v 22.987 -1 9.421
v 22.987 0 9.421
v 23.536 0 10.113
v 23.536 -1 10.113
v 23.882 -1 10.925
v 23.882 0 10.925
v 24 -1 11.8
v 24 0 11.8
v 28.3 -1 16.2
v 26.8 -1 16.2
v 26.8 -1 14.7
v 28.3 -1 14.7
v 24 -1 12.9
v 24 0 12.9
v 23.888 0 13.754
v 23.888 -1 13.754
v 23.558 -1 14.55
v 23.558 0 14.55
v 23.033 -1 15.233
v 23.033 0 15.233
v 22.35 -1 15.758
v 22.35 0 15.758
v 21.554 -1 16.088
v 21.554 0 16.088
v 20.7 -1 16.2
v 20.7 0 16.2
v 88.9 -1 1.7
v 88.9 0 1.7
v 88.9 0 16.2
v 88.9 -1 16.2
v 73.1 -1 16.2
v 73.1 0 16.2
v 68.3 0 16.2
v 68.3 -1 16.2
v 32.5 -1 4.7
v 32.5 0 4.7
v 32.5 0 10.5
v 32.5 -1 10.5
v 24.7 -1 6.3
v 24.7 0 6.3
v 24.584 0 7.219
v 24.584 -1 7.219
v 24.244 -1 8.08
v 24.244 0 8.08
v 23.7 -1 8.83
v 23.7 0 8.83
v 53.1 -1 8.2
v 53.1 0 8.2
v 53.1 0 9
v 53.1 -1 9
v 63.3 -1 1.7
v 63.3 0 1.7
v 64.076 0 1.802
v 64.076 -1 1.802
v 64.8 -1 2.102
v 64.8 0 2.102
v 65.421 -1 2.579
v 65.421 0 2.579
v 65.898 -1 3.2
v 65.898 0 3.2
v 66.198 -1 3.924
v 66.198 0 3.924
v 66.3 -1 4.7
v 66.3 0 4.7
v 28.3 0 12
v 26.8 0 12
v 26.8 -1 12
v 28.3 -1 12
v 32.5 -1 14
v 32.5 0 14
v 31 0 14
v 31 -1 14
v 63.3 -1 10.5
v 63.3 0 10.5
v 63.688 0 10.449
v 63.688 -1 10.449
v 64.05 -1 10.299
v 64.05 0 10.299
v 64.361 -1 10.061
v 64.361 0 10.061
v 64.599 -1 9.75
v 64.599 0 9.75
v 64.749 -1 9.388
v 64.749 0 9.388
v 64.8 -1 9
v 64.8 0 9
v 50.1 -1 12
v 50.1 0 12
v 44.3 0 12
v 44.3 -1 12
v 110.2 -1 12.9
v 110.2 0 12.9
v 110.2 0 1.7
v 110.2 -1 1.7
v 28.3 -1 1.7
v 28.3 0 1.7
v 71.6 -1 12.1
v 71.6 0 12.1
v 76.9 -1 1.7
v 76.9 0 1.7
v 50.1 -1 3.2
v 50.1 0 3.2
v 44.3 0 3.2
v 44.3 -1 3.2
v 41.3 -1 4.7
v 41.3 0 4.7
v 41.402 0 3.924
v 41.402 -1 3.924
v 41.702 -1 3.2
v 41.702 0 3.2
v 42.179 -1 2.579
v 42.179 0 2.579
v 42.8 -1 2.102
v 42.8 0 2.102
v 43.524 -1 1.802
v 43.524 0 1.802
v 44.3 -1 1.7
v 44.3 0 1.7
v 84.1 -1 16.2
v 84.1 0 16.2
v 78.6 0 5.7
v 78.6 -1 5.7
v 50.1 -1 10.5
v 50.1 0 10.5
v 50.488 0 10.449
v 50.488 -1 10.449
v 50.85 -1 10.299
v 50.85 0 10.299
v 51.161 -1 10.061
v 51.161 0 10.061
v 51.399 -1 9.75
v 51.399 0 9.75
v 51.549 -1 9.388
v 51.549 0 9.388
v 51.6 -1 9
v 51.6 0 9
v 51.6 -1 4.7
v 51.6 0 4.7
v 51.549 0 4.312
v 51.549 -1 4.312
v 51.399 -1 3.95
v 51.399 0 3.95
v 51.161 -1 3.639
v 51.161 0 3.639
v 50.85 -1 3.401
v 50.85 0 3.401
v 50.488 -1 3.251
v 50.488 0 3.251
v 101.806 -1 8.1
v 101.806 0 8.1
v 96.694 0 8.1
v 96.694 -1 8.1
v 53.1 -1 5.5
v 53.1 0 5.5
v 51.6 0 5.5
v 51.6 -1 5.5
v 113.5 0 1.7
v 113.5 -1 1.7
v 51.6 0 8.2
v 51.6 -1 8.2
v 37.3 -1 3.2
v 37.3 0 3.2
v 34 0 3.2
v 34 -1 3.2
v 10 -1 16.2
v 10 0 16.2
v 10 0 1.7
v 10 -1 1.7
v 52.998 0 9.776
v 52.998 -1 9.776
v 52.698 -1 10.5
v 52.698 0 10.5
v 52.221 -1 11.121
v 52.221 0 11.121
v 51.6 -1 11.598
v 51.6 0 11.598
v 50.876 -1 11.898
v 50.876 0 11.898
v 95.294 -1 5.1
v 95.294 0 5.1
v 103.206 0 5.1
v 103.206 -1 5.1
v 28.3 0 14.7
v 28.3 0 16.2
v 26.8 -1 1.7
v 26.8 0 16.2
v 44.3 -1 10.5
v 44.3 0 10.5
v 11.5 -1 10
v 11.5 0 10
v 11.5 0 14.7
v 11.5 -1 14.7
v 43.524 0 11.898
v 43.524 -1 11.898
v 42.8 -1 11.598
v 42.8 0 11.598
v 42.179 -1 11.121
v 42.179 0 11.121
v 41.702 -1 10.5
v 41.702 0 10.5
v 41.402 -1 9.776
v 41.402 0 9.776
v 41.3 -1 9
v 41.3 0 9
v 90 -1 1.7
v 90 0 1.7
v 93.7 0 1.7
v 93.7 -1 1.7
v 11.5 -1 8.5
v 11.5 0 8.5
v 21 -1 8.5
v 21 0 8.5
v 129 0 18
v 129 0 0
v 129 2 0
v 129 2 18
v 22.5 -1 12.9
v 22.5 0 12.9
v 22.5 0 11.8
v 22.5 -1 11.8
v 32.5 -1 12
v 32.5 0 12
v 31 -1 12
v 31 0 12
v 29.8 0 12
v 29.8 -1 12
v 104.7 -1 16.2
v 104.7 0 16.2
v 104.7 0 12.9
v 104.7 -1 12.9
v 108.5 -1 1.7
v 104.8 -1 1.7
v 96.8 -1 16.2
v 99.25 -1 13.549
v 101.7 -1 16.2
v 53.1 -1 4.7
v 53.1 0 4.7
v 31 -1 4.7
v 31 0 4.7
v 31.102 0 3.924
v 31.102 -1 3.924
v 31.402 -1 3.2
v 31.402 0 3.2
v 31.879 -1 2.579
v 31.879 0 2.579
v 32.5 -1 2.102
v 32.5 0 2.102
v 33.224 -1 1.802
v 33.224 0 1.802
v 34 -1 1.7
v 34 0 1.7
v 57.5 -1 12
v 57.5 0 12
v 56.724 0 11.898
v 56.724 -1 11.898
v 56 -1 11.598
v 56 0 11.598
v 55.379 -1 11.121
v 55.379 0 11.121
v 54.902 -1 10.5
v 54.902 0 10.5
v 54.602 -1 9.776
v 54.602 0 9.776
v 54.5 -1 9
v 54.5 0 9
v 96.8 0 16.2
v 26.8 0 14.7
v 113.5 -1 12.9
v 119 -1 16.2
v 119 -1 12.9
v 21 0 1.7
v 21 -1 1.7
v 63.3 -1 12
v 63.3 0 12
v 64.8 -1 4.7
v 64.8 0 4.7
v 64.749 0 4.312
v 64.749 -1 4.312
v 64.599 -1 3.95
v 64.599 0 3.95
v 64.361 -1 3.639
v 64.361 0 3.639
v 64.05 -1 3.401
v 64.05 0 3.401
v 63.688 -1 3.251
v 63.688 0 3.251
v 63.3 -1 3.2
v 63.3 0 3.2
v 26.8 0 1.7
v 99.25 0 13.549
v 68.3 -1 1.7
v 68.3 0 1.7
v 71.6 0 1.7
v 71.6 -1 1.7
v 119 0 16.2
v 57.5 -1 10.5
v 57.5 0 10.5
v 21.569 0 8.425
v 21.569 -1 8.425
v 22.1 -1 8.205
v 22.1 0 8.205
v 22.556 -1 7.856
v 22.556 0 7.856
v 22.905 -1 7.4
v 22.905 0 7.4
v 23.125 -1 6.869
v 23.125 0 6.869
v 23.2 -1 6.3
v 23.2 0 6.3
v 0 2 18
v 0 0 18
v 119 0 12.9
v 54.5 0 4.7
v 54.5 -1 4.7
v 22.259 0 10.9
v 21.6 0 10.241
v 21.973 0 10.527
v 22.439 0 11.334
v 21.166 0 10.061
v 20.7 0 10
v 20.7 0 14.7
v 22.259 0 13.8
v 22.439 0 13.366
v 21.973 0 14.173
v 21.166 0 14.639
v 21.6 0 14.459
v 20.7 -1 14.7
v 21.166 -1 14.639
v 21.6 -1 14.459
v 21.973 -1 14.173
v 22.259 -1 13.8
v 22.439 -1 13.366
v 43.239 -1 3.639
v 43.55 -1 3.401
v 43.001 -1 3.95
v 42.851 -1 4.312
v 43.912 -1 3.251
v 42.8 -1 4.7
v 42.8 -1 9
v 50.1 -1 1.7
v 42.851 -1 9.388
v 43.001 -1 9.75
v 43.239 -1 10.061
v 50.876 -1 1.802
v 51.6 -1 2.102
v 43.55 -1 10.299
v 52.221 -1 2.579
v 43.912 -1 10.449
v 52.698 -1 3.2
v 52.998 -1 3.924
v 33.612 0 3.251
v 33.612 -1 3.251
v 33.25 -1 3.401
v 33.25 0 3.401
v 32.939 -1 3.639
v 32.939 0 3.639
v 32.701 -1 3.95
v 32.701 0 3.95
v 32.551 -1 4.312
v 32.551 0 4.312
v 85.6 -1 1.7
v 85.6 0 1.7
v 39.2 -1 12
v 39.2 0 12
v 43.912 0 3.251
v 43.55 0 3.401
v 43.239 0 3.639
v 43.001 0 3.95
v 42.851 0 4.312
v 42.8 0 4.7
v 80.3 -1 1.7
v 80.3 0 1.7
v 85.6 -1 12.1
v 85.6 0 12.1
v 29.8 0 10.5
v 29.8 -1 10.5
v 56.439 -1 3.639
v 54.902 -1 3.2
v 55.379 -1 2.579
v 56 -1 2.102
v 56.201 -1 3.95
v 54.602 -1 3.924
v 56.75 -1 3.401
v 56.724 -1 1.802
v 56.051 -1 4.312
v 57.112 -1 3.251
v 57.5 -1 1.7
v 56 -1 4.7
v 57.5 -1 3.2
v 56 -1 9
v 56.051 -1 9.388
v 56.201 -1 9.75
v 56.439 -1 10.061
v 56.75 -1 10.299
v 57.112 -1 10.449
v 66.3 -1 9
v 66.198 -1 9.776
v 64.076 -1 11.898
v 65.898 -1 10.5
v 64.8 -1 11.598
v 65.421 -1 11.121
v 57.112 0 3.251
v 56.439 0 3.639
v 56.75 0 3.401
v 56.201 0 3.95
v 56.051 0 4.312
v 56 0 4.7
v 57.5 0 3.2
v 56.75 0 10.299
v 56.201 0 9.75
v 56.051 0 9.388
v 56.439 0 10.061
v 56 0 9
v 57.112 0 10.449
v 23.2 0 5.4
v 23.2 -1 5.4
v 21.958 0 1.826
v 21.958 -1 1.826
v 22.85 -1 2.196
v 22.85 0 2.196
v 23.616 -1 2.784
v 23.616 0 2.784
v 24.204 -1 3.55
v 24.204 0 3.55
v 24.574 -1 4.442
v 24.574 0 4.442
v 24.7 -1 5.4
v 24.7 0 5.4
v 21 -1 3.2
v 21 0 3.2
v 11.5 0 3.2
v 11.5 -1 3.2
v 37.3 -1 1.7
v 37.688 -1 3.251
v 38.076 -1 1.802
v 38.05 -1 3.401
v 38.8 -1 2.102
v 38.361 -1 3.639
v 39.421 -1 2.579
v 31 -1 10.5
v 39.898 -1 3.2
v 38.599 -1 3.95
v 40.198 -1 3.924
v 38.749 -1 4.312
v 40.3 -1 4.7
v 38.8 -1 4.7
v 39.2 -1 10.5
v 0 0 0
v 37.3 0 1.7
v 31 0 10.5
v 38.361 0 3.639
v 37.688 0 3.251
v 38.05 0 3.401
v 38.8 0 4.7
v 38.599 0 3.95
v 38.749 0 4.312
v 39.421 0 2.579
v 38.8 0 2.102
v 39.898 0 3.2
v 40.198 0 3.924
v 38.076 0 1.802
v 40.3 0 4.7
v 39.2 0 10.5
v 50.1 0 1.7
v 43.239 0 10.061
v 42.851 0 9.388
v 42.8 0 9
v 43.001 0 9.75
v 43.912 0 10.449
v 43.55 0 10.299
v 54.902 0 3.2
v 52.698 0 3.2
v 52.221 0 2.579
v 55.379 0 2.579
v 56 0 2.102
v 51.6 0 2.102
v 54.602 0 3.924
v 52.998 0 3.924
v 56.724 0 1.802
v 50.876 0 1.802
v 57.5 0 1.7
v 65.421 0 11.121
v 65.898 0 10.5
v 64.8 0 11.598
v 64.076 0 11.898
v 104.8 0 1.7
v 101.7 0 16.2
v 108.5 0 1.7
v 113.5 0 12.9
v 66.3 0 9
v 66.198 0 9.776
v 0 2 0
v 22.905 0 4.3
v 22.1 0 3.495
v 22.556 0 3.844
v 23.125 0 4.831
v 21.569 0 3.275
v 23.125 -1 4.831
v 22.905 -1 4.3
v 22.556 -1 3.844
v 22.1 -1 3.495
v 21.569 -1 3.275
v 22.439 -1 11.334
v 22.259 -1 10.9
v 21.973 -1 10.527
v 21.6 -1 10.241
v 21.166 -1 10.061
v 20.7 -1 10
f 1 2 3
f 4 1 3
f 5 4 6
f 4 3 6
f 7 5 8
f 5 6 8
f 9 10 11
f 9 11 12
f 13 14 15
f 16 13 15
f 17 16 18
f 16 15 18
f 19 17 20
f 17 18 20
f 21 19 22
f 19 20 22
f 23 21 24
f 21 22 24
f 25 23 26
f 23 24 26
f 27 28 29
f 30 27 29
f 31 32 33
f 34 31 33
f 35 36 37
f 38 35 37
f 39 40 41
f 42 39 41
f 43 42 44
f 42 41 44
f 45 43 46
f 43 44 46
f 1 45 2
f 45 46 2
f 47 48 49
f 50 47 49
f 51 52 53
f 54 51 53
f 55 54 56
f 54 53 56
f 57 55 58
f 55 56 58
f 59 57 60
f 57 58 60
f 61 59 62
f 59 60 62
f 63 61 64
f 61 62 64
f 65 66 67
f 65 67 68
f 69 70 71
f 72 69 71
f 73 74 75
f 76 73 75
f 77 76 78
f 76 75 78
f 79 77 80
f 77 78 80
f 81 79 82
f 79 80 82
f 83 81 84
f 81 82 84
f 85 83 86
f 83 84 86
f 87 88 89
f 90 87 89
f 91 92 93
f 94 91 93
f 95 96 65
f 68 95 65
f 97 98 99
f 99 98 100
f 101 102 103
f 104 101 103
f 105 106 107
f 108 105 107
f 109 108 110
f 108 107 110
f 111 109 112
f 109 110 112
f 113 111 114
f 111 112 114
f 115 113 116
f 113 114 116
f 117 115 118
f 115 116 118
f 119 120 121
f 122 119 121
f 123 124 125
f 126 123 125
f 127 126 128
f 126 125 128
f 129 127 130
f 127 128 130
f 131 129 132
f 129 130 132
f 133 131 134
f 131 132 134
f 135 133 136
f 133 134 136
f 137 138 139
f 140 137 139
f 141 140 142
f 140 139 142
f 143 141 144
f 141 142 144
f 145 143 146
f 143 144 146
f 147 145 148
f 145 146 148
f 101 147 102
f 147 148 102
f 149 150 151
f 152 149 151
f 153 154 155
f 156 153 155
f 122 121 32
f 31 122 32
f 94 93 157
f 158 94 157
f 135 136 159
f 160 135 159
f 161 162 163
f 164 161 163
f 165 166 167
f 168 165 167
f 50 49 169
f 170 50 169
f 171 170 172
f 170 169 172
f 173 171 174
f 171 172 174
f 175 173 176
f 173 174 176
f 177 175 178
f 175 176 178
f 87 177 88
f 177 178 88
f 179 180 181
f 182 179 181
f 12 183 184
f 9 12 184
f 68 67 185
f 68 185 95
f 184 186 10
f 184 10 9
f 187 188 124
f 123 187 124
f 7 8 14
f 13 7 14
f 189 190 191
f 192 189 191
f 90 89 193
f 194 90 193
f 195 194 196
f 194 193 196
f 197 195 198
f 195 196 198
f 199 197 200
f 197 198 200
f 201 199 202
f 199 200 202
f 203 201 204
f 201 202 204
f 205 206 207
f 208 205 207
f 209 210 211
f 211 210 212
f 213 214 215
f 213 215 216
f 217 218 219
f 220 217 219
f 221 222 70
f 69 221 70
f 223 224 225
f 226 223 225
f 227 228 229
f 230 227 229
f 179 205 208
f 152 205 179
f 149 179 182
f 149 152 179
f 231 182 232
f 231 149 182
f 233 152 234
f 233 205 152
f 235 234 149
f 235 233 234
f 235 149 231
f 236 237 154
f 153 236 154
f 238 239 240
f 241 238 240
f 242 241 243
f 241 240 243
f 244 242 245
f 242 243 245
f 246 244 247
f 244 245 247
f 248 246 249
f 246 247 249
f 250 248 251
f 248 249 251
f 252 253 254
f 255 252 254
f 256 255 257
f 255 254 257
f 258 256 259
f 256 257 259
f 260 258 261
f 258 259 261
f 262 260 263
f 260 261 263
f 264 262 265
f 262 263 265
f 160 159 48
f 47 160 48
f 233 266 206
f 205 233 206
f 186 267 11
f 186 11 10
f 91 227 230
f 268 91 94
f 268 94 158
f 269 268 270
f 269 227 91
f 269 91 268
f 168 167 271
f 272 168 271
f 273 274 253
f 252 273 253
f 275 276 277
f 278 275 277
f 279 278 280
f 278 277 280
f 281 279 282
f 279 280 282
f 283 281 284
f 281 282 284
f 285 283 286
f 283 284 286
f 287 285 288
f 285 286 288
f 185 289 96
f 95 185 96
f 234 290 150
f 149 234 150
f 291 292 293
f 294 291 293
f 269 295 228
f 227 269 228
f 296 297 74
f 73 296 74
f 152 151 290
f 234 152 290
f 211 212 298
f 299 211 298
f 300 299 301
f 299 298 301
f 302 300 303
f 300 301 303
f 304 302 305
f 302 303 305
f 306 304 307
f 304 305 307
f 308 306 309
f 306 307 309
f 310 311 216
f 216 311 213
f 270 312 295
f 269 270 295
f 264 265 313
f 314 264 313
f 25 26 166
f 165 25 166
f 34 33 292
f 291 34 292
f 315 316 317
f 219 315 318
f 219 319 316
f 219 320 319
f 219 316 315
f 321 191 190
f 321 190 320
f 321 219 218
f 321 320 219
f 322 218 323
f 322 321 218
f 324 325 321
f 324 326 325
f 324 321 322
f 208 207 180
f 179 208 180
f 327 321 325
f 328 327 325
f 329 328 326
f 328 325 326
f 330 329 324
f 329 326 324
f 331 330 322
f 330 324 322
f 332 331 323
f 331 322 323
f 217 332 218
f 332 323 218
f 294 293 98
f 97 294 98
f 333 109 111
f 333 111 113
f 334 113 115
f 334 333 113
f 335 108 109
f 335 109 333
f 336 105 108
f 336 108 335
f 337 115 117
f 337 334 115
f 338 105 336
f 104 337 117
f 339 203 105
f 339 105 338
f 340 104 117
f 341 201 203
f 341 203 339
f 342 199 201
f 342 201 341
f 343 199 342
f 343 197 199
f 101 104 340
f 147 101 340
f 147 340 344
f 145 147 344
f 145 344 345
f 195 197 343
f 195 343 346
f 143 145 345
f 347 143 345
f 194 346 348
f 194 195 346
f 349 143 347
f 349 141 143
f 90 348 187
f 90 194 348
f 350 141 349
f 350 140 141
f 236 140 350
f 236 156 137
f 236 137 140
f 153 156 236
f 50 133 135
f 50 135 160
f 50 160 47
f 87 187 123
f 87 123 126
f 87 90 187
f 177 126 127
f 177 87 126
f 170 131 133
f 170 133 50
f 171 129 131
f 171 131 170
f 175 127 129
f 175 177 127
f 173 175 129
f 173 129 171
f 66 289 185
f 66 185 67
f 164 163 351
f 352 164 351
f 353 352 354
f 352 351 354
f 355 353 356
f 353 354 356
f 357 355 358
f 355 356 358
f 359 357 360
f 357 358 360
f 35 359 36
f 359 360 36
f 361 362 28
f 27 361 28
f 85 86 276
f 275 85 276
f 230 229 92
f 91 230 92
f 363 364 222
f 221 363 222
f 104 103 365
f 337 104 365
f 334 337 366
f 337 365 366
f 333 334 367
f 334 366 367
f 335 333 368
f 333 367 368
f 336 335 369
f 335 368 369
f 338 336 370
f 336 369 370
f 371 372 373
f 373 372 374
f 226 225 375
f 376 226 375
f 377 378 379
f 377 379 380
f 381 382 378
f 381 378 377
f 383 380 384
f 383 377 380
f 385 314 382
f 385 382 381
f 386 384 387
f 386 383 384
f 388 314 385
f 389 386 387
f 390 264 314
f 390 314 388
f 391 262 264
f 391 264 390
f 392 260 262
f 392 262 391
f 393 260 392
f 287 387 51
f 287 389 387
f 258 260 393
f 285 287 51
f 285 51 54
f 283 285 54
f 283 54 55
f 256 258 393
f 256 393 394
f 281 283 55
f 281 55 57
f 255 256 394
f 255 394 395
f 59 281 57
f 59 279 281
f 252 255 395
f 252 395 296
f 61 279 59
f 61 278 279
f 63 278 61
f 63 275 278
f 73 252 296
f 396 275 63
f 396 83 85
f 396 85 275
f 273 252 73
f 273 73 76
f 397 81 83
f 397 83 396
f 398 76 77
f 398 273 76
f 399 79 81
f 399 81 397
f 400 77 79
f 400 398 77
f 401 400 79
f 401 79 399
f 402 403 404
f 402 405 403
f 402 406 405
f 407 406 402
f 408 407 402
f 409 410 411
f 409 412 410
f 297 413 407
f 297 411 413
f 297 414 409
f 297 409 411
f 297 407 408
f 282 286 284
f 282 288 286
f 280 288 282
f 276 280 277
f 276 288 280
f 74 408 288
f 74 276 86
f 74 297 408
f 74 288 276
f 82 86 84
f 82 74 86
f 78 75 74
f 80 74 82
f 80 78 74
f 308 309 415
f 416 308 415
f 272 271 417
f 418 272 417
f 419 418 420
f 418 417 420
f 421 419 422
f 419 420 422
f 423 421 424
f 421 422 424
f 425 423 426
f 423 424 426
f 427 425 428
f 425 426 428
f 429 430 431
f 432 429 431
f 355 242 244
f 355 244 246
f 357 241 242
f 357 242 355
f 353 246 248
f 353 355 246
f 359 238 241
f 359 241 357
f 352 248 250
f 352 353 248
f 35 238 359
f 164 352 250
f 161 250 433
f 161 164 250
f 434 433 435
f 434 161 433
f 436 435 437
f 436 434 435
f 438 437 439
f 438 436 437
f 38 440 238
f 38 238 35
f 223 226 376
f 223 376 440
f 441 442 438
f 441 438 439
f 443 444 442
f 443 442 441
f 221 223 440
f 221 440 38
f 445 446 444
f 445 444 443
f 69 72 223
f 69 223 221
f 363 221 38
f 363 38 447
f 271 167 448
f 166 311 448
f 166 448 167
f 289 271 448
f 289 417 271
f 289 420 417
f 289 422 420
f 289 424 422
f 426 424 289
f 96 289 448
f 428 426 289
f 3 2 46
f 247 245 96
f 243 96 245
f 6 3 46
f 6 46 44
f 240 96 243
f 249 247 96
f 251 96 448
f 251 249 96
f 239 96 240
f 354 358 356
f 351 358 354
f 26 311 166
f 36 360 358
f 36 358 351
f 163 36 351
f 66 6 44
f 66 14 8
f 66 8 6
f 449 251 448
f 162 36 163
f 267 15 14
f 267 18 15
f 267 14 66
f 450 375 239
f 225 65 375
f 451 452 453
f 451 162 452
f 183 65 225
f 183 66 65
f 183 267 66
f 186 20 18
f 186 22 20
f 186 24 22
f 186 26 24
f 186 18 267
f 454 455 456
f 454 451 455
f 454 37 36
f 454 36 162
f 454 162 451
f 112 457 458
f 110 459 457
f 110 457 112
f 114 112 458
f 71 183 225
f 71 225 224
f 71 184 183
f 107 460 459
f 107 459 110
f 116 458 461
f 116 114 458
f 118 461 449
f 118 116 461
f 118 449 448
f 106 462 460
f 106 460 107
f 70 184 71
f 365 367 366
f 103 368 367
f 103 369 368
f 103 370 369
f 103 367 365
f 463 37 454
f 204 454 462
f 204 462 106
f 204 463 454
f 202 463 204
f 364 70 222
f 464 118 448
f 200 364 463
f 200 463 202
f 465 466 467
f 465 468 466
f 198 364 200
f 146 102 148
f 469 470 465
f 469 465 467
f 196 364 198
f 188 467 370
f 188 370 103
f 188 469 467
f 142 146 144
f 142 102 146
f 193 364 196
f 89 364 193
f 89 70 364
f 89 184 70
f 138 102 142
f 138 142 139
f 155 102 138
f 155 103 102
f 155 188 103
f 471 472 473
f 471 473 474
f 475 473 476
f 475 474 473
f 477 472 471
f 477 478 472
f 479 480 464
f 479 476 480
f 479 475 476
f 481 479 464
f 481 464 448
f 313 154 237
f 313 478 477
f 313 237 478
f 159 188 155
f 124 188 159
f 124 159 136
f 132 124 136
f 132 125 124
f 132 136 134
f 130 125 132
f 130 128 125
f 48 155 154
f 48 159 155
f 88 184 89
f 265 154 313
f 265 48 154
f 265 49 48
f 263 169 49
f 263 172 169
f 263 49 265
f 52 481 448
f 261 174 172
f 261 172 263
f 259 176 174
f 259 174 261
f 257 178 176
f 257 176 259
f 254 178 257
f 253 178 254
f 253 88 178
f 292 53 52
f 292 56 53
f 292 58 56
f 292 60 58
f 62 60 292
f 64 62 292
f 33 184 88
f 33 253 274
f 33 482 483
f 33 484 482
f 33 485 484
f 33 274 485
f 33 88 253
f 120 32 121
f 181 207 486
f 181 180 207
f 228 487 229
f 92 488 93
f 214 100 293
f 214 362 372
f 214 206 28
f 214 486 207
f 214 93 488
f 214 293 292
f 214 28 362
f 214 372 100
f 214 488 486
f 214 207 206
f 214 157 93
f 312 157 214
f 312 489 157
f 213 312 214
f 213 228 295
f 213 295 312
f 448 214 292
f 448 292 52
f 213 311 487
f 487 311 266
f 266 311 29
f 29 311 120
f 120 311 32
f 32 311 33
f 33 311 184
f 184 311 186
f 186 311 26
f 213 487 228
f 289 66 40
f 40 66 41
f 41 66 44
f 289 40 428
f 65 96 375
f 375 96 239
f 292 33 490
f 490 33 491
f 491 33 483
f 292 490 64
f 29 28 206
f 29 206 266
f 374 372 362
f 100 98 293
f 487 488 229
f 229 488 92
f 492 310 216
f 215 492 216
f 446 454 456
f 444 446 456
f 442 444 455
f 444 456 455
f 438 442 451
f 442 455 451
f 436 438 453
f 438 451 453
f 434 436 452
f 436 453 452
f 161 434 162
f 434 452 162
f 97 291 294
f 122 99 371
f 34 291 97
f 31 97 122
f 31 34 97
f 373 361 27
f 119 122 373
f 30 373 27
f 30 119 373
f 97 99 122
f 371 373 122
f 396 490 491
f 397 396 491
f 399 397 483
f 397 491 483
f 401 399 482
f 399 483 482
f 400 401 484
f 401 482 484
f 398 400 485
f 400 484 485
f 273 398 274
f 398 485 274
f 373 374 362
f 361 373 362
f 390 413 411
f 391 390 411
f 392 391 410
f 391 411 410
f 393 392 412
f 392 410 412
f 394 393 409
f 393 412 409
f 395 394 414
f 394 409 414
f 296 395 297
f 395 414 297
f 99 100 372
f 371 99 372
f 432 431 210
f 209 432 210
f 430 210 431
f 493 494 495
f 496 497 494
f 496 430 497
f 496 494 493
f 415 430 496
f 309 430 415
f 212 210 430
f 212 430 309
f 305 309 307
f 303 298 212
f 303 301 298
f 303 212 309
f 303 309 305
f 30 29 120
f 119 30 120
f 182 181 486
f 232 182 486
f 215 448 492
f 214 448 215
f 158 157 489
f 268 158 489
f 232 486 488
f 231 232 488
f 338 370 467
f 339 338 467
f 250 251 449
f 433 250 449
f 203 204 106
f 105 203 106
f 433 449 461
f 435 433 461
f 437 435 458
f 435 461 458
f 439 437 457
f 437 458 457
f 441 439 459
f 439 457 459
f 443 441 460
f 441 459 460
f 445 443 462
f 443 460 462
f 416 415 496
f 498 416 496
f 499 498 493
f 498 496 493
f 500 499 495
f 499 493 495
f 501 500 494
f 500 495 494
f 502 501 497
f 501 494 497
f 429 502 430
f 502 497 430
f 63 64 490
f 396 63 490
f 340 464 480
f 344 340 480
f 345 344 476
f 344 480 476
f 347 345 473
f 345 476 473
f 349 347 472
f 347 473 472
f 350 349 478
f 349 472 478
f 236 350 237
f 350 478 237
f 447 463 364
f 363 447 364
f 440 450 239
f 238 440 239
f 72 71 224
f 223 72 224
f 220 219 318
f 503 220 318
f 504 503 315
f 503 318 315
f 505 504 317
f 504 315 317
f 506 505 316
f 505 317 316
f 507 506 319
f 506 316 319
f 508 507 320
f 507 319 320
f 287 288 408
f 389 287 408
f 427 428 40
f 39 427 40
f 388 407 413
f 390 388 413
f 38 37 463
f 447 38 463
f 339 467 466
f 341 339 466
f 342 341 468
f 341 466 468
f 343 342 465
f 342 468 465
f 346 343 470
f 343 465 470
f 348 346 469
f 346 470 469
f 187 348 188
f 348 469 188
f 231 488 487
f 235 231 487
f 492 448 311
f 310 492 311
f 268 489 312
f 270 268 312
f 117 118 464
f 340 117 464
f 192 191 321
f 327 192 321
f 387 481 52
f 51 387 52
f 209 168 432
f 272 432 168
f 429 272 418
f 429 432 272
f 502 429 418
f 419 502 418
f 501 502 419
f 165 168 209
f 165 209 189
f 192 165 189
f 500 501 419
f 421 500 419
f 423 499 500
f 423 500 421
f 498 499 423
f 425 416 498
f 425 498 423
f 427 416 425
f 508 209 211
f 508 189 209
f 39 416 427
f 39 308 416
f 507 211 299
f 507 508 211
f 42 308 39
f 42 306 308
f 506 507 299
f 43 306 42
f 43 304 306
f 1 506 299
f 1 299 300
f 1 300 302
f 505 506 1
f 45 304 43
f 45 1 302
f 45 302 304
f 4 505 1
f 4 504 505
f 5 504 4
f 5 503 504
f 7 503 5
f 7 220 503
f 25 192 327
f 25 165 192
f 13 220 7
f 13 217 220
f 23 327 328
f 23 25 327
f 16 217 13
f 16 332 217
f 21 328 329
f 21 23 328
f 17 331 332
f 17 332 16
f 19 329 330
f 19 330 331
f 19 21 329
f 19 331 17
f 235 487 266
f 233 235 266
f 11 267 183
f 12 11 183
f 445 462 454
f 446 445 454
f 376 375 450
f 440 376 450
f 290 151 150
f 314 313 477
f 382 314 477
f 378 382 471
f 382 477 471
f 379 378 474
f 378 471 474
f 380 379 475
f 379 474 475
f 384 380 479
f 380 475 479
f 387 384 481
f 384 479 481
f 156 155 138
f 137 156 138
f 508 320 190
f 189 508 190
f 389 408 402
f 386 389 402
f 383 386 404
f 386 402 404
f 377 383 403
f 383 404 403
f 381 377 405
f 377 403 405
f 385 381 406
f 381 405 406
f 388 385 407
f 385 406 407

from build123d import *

# Parameters (mm, degrees)
F0_W     = 129
F0_H     = 18
F0_W_2   = 1.5
F0_H_2   = 10.3
F0_R     = 2.1
F0_H_3   = 1.5
F1_DEPTH = 2
F2_DEPTH = 1
F3_R     = 2.1
F4_DEPTH = 2


with BuildPart() as f1:
    # F0 (on Front) → F1 (new body)
    with BuildSketch(Plane.XZ):
        with Locations((64.5, 9)):
            Rectangle(F0_W, F0_H)
        with Locations((27.55, 6.85)):
            Rectangle(F0_W_2, F0_H_2, mode=Mode.SUBTRACT)
        with BuildLine():
            Line((10, 1.7), (10, 16.2))
            Line((10, 16.2), (20.7, 16.2))
            ThreePointArc((20.7, 16.2), (23.0334523779, 15.2334523779), (24, 12.9))
            Line((24, 12.9), (24, 11.8))
            ThreePointArc((24, 11.8), (23.7362385725, 10.5072295908), (22.9871179813, 9.4211155263))
            ThreePointArc((22.9871179813, 9.4211155263), (24.2436350389, 8.0801212696), (24.7, 6.3))
            Line((24.7, 6.3), (24.7, 5.4))
            ThreePointArc((24.7, 5.4), (23.6162950904, 2.7837049096), (21, 1.7))
            Line((21, 1.7), (10, 1.7))
        make_face(mode=Mode.SUBTRACT)
        with BuildLine():
            Line((32.5, 10.5), (32.5, 4.7))
            ThreePointArc((32.5, 4.7), (32.9393398282, 3.6393398282), (34, 3.2))
            Line((34, 3.2), (37.3, 3.2))
            ThreePointArc((37.3, 3.2), (38.3606601718, 3.6393398282), (38.8, 4.7))
            Line((38.8, 4.7), (40.3, 4.7))
            ThreePointArc((40.3, 4.7), (39.4213203436, 2.5786796564), (37.3, 1.7))
            Line((37.3, 1.7), (34, 1.7))
            ThreePointArc((34, 1.7), (31.8786796564, 2.5786796564), (31, 4.7))
            Line((31, 4.7), (31, 10.5))
            Line((31, 10.5), (29.8, 10.5))
            Line((29.8, 10.5), (29.8, 12))
            Line((29.8, 12), (31, 12))
            Line((31, 12), (31, 14))
            Line((31, 14), (32.5, 14))
            Line((32.5, 14), (32.5, 12))
            Line((32.5, 12), (39.2, 12))
            Line((39.2, 12), (39.2, 10.5))
            Line((39.2, 10.5), (32.5, 10.5))
        make_face(mode=Mode.SUBTRACT)
        with BuildLine():
            Line((50.1, 10.5), (44.3, 10.5))
            ThreePointArc((44.3, 10.5), (43.2393398282, 10.0606601718), (42.8, 9))
            Line((42.8, 9), (42.8, 4.7))
            ThreePointArc((42.8, 4.7), (43.2393398282, 3.6393398282), (44.3, 3.2))
            Line((44.3, 3.2), (50.1, 3.2))
            ThreePointArc((50.1, 3.2), (51.1606601718, 3.6393398282), (51.6, 4.7))
            Line((51.6, 4.7), (51.6, 5.5))
            Line((51.6, 5.5), (53.1, 5.5))
            Line((53.1, 5.5), (53.1, 4.7))
            ThreePointArc((53.1, 4.7), (52.2213203436, 2.5786796564), (50.1, 1.7))
            Line((50.1, 1.7), (44.3, 1.7))
            ThreePointArc((44.3, 1.7), (42.1786796564, 2.5786796564), (41.3, 4.7))
            Line((41.3, 4.7), (41.3, 9))
            ThreePointArc((41.3, 9), (42.1786796564, 11.1213203436), (44.3, 12))
            Line((44.3, 12), (50.1, 12))
            ThreePointArc((50.1, 12), (52.2213203436, 11.1213203436), (53.1, 9))
            Line((53.1, 9), (53.1, 8.2))
            Line((53.1, 8.2), (51.6, 8.2))
            Line((51.6, 8.2), (51.6, 9))
            ThreePointArc((51.6, 9), (51.1606601718, 10.0606601718), (50.1, 10.5))
        make_face(mode=Mode.SUBTRACT)
        with BuildLine():
            ThreePointArc((54.5, 9), (55.3786796564, 11.1213203436), (57.5, 12))
            Line((57.5, 12), (63.3, 12))
            ThreePointArc((63.3, 12), (65.4213203436, 11.1213203436), (66.3, 9))
            Line((66.3, 9), (66.3, 4.7))
            ThreePointArc((66.3, 4.7), (65.4213203436, 2.5786796564), (63.3, 1.7))
            Line((63.3, 1.7), (57.5, 1.7))
            ThreePointArc((57.5, 1.7), (55.3786796564, 2.5786796564), (54.5, 4.7))
            Line((54.5, 4.7), (54.5, 9))
        make_face(mode=Mode.SUBTRACT)
        Polygon((71.6, 12.1), (71.6, 1.7), (68.3, 1.7), (68.3, 16.2), (73.1, 16.2), (78.6, 5.7), (84.1, 16.2), (88.9, 16.2), (88.9, 1.7), (85.6, 1.7), (85.6, 12.1), (80.3, 1.7), (76.9, 1.7), align=None, mode=Mode.SUBTRACT)
        Polygon((93.7, 1.7), (90, 1.7), (96.8, 16.2), (101.7, 16.2), (108.5, 1.7), (104.8, 1.7), (103.2055172414, 5.1), (95.2944827586, 5.1), align=None, mode=Mode.SUBTRACT)
        Polygon((104.7, 12.9), (104.7, 16.2), (119, 16.2), (119, 12.9), (113.5, 12.9), (113.5, 1.7), (110.2, 1.7), (110.2, 12.9), align=None, mode=Mode.SUBTRACT)
        with Locations((5, 9)):
            Circle(F0_R, mode=Mode.SUBTRACT)
        with Locations((27.55, 15.45)):
            Rectangle(F0_W_2, F0_H_3, mode=Mode.SUBTRACT)
        with Locations((124, 9)):
            Circle(F0_R, mode=Mode.SUBTRACT)
        with BuildLine():
            Line((20.7, 16.2), (10, 16.2))
            Line((10, 16.2), (10, 1.7))
            Line((10, 1.7), (21, 1.7))
            ThreePointArc((21, 1.7), (23.6162950904, 2.7837049096), (24.7, 5.4))
            Line((24.7, 5.4), (24.7, 6.3))
            ThreePointArc((24.7, 6.3), (24.2436350389, 8.0801212696), (22.9871179813, 9.4211155263))
            ThreePointArc((22.9871179813, 9.4211155263), (23.7362385725, 10.5072295908), (24, 11.8))
            Line((24, 11.8), (24, 12.9))
            ThreePointArc((24, 12.9), (23.0334523779, 15.2334523779), (20.7, 16.2))
        make_face()
        with BuildLine():
            Line((11.5, 8.5), (21, 8.5))
            ThreePointArc((21, 8.5), (22.5556349186, 7.8556349186), (23.2, 6.3))
            Line((23.2, 6.3), (23.2, 5.4))
            ThreePointArc((23.2, 5.4), (22.5556349186, 3.8443650814), (21, 3.2))
            Line((21, 3.2), (11.5, 3.2))
            Line((11.5, 3.2), (11.5, 8.5))
        make_face(mode=Mode.SUBTRACT)
        with BuildLine():
            Line((11.5, 14.7), (20.7, 14.7))
            ThreePointArc((20.7, 14.7), (21.9727922061, 14.1727922061), (22.5, 12.9))
            Line((22.5, 12.9), (22.5, 11.8))
            ThreePointArc((22.5, 11.8), (21.9727922061, 10.5272077939), (20.7, 10))
            Line((20.7, 10), (11.5, 10))
            Line((11.5, 10), (11.5, 14.7))
        make_face(mode=Mode.SUBTRACT)
        Polygon((68.3, 1.7), (71.6, 1.7), (71.6, 12.1), (76.9, 1.7), (80.3, 1.7), (85.6, 12.1), (85.6, 1.7), (88.9, 1.7), (88.9, 16.2), (84.1, 16.2), (78.6, 5.7), (73.1, 16.2), (68.3, 16.2), align=None)
        Polygon((96.8, 16.2), (90, 1.7), (93.7, 1.7), (95.2944827586, 5.1), (103.2055172414, 5.1), (104.8, 1.7), (108.5, 1.7), (101.7, 16.2), align=None)
        Polygon((99.25, 13.5492647059), (101.8055172414, 8.1), (96.6944827586, 8.1), align=None, mode=Mode.SUBTRACT)
        with BuildLine():
            Line((63.3, 12), (57.5, 12))
            ThreePointArc((57.5, 12), (55.3786796564, 11.1213203436), (54.5, 9))
            Line((54.5, 9), (54.5, 4.7))
            ThreePointArc((54.5, 4.7), (55.3786796564, 2.5786796564), (57.5, 1.7))
            Line((57.5, 1.7), (63.3, 1.7))
            ThreePointArc((63.3, 1.7), (65.4213203436, 2.5786796564), (66.3, 4.7))
            Line((66.3, 4.7), (66.3, 9))
            ThreePointArc((66.3, 9), (65.4213203436, 11.1213203436), (63.3, 12))
        make_face()
        with BuildLine():
            ThreePointArc((56, 9), (56.4393398282, 10.0606601718), (57.5, 10.5))
            Line((57.5, 10.5), (63.3, 10.5))
            ThreePointArc((63.3, 10.5), (64.3606601718, 10.0606601718), (64.8, 9))
            Line((64.8, 9), (64.8, 4.7))
            ThreePointArc((64.8, 4.7), (64.3606601718, 3.6393398282), (63.3, 3.2))
            Line((63.3, 3.2), (57.5, 3.2))
            ThreePointArc((57.5, 3.2), (56.4393398282, 3.6393398282), (56, 4.7))
            Line((56, 4.7), (56, 9))
        make_face(mode=Mode.SUBTRACT)
        Polygon((119, 16.2), (104.7, 16.2), (104.7, 12.9), (110.2, 12.9), (110.2, 1.7), (113.5, 1.7), (113.5, 12.9), (119, 12.9), align=None)
        with BuildLine():
            Line((63.3, 10.5), (57.5, 10.5))
            ThreePointArc((57.5, 10.5), (56.4393398282, 10.0606601718), (56, 9))
            Line((56, 9), (56, 4.7))
            ThreePointArc((56, 4.7), (56.4393398282, 3.6393398282), (57.5, 3.2))
            Line((57.5, 3.2), (63.3, 3.2))
            ThreePointArc((63.3, 3.2), (64.3606601718, 3.6393398282), (64.8, 4.7))
            Line((64.8, 4.7), (64.8, 9))
            ThreePointArc((64.8, 9), (64.3606601718, 10.0606601718), (63.3, 10.5))
        make_face()
        with BuildLine():
            ThreePointArc((23.2, 6.3), (22.5556349186, 7.8556349186), (21, 8.5))
            Line((21, 8.5), (11.5, 8.5))
            Line((11.5, 8.5), (11.5, 3.2))
            Line((11.5, 3.2), (21, 3.2))
            ThreePointArc((21, 3.2), (22.5556349186, 3.8443650814), (23.2, 5.4))
            Line((23.2, 5.4), (23.2, 6.3))
        make_face()
        with BuildLine():
            ThreePointArc((22.5, 12.9), (21.9727922061, 14.1727922061), (20.7, 14.7))
            Line((20.7, 14.7), (11.5, 14.7))
            Line((11.5, 14.7), (11.5, 10))
            Line((11.5, 10), (20.7, 10))
            ThreePointArc((20.7, 10), (21.9727922061, 10.5272077939), (22.5, 11.8))
            Line((22.5, 11.8), (22.5, 12.9))
        make_face()
        with BuildLine():
            ThreePointArc((42.8, 9), (43.2393398282, 10.0606601718), (44.3, 10.5))
            Line((44.3, 10.5), (50.1, 10.5))
            ThreePointArc((50.1, 10.5), (51.1606601718, 10.0606601718), (51.6, 9))
            Line((51.6, 9), (51.6, 8.2))
            Line((51.6, 8.2), (53.1, 8.2))
            Line((53.1, 8.2), (53.1, 9))
            ThreePointArc((53.1, 9), (52.2213203436, 11.1213203436), (50.1, 12))
            Line((50.1, 12), (44.3, 12))
            ThreePointArc((44.3, 12), (42.1786796564, 11.1213203436), (41.3, 9))
            Line((41.3, 9), (41.3, 4.7))
            ThreePointArc((41.3, 4.7), (42.1786796564, 2.5786796564), (44.3, 1.7))
            Line((44.3, 1.7), (50.1, 1.7))
            ThreePointArc((50.1, 1.7), (52.2213203436, 2.5786796564), (53.1, 4.7))
            Line((53.1, 4.7), (53.1, 5.5))
            Line((53.1, 5.5), (51.6, 5.5))
            Line((51.6, 5.5), (51.6, 4.7))
            ThreePointArc((51.6, 4.7), (51.1606601718, 3.6393398282), (50.1, 3.2))
            Line((50.1, 3.2), (44.3, 3.2))
            ThreePointArc((44.3, 3.2), (43.2393398282, 3.6393398282), (42.8, 4.7))
            Line((42.8, 4.7), (42.8, 9))
        make_face()
        with BuildLine():
            ThreePointArc((34, 3.2), (32.9393398282, 3.6393398282), (32.5, 4.7))
            Line((32.5, 4.7), (32.5, 10.5))
            Line((32.5, 10.5), (39.2, 10.5))
            Line((39.2, 10.5), (39.2, 12))
            Line((39.2, 12), (32.5, 12))
            Line((32.5, 12), (32.5, 14))
            Line((32.5, 14), (31, 14))
            Line((31, 14), (31, 12))
            Line((31, 12), (29.8, 12))
            Line((29.8, 12), (29.8, 10.5))
            Line((29.8, 10.5), (31, 10.5))
            Line((31, 10.5), (31, 4.7))
            ThreePointArc((31, 4.7), (31.8786796564, 2.5786796564), (34, 1.7))
            Line((34, 1.7), (37.3, 1.7))
            ThreePointArc((37.3, 1.7), (39.4213203436, 2.5786796564), (40.3, 4.7))
            Line((40.3, 4.7), (38.8, 4.7))
            ThreePointArc((38.8, 4.7), (38.3606601718, 3.6393398282), (37.3, 3.2))
            Line((37.3, 3.2), (34, 3.2))
        make_face()
        with Locations((27.55, 6.85)):
            Rectangle(F0_W_2, F0_H_2)
        Polygon((96.6944827586, 8.1), (101.8055172414, 8.1), (99.25, 13.5492647059), align=None)
        with Locations((27.55, 15.45)):
            Rectangle(F0_W_2, F0_H_3)
    extrude(amount=-F1_DEPTH)

    # F0 (on Front) → F2 (join)
    with BuildSketch(Plane.XZ):
        with BuildLine():
            Line((20.7, 16.2), (10, 16.2))
            Line((10, 16.2), (10, 1.7))
            Line((10, 1.7), (21, 1.7))
            ThreePointArc((21, 1.7), (23.6162950904, 2.7837049096), (24.7, 5.4))
            Line((24.7, 5.4), (24.7, 6.3))
            ThreePointArc((24.7, 6.3), (24.2436350389, 8.0801212696), (22.9871179813, 9.4211155263))
            ThreePointArc((22.9871179813, 9.4211155263), (23.7362385725, 10.5072295908), (24, 11.8))
            Line((24, 11.8), (24, 12.9))
            ThreePointArc((24, 12.9), (23.0334523779, 15.2334523779), (20.7, 16.2))
        make_face()
        with BuildLine():
            Line((11.5, 8.5), (21, 8.5))
            ThreePointArc((21, 8.5), (22.5556349186, 7.8556349186), (23.2, 6.3))
            Line((23.2, 6.3), (23.2, 5.4))
            ThreePointArc((23.2, 5.4), (22.5556349186, 3.8443650814), (21, 3.2))
            Line((21, 3.2), (11.5, 3.2))
            Line((11.5, 3.2), (11.5, 8.5))
        make_face(mode=Mode.SUBTRACT)
        with BuildLine():
            Line((11.5, 14.7), (20.7, 14.7))
            ThreePointArc((20.7, 14.7), (21.9727922061, 14.1727922061), (22.5, 12.9))
            Line((22.5, 12.9), (22.5, 11.8))
            ThreePointArc((22.5, 11.8), (21.9727922061, 10.5272077939), (20.7, 10))
            Line((20.7, 10), (11.5, 10))
            Line((11.5, 10), (11.5, 14.7))
        make_face(mode=Mode.SUBTRACT)
        with Locations((27.55, 6.85)):
            Rectangle(F0_W_2, F0_H_2)
        with Locations((27.55, 15.45)):
            Rectangle(F0_W_2, F0_H_3)
        with BuildLine():
            ThreePointArc((34, 3.2), (32.9393398282, 3.6393398282), (32.5, 4.7))
            Line((32.5, 4.7), (32.5, 10.5))
            Line((32.5, 10.5), (39.2, 10.5))
            Line((39.2, 10.5), (39.2, 12))
            Line((39.2, 12), (32.5, 12))
            Line((32.5, 12), (32.5, 14))
            Line((32.5, 14), (31, 14))
            Line((31, 14), (31, 12))
            Line((31, 12), (29.8, 12))
            Line((29.8, 12), (29.8, 10.5))
            Line((29.8, 10.5), (31, 10.5))
            Line((31, 10.5), (31, 4.7))
            ThreePointArc((31, 4.7), (31.8786796564, 2.5786796564), (34, 1.7))
            Line((34, 1.7), (37.3, 1.7))
            ThreePointArc((37.3, 1.7), (39.4213203436, 2.5786796564), (40.3, 4.7))
            Line((40.3, 4.7), (38.8, 4.7))
            ThreePointArc((38.8, 4.7), (38.3606601718, 3.6393398282), (37.3, 3.2))
            Line((37.3, 3.2), (34, 3.2))
        make_face()
        with BuildLine():
            ThreePointArc((42.8, 9), (43.2393398282, 10.0606601718), (44.3, 10.5))
            Line((44.3, 10.5), (50.1, 10.5))
            ThreePointArc((50.1, 10.5), (51.1606601718, 10.0606601718), (51.6, 9))
            Line((51.6, 9), (51.6, 8.2))
            Line((51.6, 8.2), (53.1, 8.2))
            Line((53.1, 8.2), (53.1, 9))
            ThreePointArc((53.1, 9), (52.2213203436, 11.1213203436), (50.1, 12))
            Line((50.1, 12), (44.3, 12))
            ThreePointArc((44.3, 12), (42.1786796564, 11.1213203436), (41.3, 9))
            Line((41.3, 9), (41.3, 4.7))
            ThreePointArc((41.3, 4.7), (42.1786796564, 2.5786796564), (44.3, 1.7))
            Line((44.3, 1.7), (50.1, 1.7))
            ThreePointArc((50.1, 1.7), (52.2213203436, 2.5786796564), (53.1, 4.7))
            Line((53.1, 4.7), (53.1, 5.5))
            Line((53.1, 5.5), (51.6, 5.5))
            Line((51.6, 5.5), (51.6, 4.7))
            ThreePointArc((51.6, 4.7), (51.1606601718, 3.6393398282), (50.1, 3.2))
            Line((50.1, 3.2), (44.3, 3.2))
            ThreePointArc((44.3, 3.2), (43.2393398282, 3.6393398282), (42.8, 4.7))
            Line((42.8, 4.7), (42.8, 9))
        make_face()
        with BuildLine():
            Line((63.3, 12), (57.5, 12))
            ThreePointArc((57.5, 12), (55.3786796564, 11.1213203436), (54.5, 9))
            Line((54.5, 9), (54.5, 4.7))
            ThreePointArc((54.5, 4.7), (55.3786796564, 2.5786796564), (57.5, 1.7))
            Line((57.5, 1.7), (63.3, 1.7))
            ThreePointArc((63.3, 1.7), (65.4213203436, 2.5786796564), (66.3, 4.7))
            Line((66.3, 4.7), (66.3, 9))
            ThreePointArc((66.3, 9), (65.4213203436, 11.1213203436), (63.3, 12))
        make_face()
        with BuildLine():
            ThreePointArc((56, 9), (56.4393398282, 10.0606601718), (57.5, 10.5))
            Line((57.5, 10.5), (63.3, 10.5))
            ThreePointArc((63.3, 10.5), (64.3606601718, 10.0606601718), (64.8, 9))
            Line((64.8, 9), (64.8, 4.7))
            ThreePointArc((64.8, 4.7), (64.3606601718, 3.6393398282), (63.3, 3.2))
            Line((63.3, 3.2), (57.5, 3.2))
            ThreePointArc((57.5, 3.2), (56.4393398282, 3.6393398282), (56, 4.7))
            Line((56, 4.7), (56, 9))
        make_face(mode=Mode.SUBTRACT)
        Polygon((68.3, 1.7), (71.6, 1.7), (71.6, 12.1), (76.9, 1.7), (80.3, 1.7), (85.6, 12.1), (85.6, 1.7), (88.9, 1.7), (88.9, 16.2), (84.1, 16.2), (78.6, 5.7), (73.1, 16.2), (68.3, 16.2), align=None)
        Polygon((96.8, 16.2), (90, 1.7), (93.7, 1.7), (95.2944827586, 5.1), (103.2055172414, 5.1), (104.8, 1.7), (108.5, 1.7), (101.7, 16.2), align=None)
        Polygon((99.25, 13.5492647059), (101.8055172414, 8.1), (96.6944827586, 8.1), align=None, mode=Mode.SUBTRACT)
        Polygon((119, 16.2), (104.7, 16.2), (104.7, 12.9), (110.2, 12.9), (110.2, 1.7), (113.5, 1.7), (113.5, 12.9), (119, 12.9), align=None)
    extrude(amount=F2_DEPTH)

    # F3 (on face) → F4 (join, through all)
    with BuildSketch(Plane.XZ):
        with Locations((5, 9)):
            Circle(F3_R)
        with Locations((124, 9)):
            Circle(F3_R)
    extrude(amount=-F4_DEPTH)


solid = f1.part
